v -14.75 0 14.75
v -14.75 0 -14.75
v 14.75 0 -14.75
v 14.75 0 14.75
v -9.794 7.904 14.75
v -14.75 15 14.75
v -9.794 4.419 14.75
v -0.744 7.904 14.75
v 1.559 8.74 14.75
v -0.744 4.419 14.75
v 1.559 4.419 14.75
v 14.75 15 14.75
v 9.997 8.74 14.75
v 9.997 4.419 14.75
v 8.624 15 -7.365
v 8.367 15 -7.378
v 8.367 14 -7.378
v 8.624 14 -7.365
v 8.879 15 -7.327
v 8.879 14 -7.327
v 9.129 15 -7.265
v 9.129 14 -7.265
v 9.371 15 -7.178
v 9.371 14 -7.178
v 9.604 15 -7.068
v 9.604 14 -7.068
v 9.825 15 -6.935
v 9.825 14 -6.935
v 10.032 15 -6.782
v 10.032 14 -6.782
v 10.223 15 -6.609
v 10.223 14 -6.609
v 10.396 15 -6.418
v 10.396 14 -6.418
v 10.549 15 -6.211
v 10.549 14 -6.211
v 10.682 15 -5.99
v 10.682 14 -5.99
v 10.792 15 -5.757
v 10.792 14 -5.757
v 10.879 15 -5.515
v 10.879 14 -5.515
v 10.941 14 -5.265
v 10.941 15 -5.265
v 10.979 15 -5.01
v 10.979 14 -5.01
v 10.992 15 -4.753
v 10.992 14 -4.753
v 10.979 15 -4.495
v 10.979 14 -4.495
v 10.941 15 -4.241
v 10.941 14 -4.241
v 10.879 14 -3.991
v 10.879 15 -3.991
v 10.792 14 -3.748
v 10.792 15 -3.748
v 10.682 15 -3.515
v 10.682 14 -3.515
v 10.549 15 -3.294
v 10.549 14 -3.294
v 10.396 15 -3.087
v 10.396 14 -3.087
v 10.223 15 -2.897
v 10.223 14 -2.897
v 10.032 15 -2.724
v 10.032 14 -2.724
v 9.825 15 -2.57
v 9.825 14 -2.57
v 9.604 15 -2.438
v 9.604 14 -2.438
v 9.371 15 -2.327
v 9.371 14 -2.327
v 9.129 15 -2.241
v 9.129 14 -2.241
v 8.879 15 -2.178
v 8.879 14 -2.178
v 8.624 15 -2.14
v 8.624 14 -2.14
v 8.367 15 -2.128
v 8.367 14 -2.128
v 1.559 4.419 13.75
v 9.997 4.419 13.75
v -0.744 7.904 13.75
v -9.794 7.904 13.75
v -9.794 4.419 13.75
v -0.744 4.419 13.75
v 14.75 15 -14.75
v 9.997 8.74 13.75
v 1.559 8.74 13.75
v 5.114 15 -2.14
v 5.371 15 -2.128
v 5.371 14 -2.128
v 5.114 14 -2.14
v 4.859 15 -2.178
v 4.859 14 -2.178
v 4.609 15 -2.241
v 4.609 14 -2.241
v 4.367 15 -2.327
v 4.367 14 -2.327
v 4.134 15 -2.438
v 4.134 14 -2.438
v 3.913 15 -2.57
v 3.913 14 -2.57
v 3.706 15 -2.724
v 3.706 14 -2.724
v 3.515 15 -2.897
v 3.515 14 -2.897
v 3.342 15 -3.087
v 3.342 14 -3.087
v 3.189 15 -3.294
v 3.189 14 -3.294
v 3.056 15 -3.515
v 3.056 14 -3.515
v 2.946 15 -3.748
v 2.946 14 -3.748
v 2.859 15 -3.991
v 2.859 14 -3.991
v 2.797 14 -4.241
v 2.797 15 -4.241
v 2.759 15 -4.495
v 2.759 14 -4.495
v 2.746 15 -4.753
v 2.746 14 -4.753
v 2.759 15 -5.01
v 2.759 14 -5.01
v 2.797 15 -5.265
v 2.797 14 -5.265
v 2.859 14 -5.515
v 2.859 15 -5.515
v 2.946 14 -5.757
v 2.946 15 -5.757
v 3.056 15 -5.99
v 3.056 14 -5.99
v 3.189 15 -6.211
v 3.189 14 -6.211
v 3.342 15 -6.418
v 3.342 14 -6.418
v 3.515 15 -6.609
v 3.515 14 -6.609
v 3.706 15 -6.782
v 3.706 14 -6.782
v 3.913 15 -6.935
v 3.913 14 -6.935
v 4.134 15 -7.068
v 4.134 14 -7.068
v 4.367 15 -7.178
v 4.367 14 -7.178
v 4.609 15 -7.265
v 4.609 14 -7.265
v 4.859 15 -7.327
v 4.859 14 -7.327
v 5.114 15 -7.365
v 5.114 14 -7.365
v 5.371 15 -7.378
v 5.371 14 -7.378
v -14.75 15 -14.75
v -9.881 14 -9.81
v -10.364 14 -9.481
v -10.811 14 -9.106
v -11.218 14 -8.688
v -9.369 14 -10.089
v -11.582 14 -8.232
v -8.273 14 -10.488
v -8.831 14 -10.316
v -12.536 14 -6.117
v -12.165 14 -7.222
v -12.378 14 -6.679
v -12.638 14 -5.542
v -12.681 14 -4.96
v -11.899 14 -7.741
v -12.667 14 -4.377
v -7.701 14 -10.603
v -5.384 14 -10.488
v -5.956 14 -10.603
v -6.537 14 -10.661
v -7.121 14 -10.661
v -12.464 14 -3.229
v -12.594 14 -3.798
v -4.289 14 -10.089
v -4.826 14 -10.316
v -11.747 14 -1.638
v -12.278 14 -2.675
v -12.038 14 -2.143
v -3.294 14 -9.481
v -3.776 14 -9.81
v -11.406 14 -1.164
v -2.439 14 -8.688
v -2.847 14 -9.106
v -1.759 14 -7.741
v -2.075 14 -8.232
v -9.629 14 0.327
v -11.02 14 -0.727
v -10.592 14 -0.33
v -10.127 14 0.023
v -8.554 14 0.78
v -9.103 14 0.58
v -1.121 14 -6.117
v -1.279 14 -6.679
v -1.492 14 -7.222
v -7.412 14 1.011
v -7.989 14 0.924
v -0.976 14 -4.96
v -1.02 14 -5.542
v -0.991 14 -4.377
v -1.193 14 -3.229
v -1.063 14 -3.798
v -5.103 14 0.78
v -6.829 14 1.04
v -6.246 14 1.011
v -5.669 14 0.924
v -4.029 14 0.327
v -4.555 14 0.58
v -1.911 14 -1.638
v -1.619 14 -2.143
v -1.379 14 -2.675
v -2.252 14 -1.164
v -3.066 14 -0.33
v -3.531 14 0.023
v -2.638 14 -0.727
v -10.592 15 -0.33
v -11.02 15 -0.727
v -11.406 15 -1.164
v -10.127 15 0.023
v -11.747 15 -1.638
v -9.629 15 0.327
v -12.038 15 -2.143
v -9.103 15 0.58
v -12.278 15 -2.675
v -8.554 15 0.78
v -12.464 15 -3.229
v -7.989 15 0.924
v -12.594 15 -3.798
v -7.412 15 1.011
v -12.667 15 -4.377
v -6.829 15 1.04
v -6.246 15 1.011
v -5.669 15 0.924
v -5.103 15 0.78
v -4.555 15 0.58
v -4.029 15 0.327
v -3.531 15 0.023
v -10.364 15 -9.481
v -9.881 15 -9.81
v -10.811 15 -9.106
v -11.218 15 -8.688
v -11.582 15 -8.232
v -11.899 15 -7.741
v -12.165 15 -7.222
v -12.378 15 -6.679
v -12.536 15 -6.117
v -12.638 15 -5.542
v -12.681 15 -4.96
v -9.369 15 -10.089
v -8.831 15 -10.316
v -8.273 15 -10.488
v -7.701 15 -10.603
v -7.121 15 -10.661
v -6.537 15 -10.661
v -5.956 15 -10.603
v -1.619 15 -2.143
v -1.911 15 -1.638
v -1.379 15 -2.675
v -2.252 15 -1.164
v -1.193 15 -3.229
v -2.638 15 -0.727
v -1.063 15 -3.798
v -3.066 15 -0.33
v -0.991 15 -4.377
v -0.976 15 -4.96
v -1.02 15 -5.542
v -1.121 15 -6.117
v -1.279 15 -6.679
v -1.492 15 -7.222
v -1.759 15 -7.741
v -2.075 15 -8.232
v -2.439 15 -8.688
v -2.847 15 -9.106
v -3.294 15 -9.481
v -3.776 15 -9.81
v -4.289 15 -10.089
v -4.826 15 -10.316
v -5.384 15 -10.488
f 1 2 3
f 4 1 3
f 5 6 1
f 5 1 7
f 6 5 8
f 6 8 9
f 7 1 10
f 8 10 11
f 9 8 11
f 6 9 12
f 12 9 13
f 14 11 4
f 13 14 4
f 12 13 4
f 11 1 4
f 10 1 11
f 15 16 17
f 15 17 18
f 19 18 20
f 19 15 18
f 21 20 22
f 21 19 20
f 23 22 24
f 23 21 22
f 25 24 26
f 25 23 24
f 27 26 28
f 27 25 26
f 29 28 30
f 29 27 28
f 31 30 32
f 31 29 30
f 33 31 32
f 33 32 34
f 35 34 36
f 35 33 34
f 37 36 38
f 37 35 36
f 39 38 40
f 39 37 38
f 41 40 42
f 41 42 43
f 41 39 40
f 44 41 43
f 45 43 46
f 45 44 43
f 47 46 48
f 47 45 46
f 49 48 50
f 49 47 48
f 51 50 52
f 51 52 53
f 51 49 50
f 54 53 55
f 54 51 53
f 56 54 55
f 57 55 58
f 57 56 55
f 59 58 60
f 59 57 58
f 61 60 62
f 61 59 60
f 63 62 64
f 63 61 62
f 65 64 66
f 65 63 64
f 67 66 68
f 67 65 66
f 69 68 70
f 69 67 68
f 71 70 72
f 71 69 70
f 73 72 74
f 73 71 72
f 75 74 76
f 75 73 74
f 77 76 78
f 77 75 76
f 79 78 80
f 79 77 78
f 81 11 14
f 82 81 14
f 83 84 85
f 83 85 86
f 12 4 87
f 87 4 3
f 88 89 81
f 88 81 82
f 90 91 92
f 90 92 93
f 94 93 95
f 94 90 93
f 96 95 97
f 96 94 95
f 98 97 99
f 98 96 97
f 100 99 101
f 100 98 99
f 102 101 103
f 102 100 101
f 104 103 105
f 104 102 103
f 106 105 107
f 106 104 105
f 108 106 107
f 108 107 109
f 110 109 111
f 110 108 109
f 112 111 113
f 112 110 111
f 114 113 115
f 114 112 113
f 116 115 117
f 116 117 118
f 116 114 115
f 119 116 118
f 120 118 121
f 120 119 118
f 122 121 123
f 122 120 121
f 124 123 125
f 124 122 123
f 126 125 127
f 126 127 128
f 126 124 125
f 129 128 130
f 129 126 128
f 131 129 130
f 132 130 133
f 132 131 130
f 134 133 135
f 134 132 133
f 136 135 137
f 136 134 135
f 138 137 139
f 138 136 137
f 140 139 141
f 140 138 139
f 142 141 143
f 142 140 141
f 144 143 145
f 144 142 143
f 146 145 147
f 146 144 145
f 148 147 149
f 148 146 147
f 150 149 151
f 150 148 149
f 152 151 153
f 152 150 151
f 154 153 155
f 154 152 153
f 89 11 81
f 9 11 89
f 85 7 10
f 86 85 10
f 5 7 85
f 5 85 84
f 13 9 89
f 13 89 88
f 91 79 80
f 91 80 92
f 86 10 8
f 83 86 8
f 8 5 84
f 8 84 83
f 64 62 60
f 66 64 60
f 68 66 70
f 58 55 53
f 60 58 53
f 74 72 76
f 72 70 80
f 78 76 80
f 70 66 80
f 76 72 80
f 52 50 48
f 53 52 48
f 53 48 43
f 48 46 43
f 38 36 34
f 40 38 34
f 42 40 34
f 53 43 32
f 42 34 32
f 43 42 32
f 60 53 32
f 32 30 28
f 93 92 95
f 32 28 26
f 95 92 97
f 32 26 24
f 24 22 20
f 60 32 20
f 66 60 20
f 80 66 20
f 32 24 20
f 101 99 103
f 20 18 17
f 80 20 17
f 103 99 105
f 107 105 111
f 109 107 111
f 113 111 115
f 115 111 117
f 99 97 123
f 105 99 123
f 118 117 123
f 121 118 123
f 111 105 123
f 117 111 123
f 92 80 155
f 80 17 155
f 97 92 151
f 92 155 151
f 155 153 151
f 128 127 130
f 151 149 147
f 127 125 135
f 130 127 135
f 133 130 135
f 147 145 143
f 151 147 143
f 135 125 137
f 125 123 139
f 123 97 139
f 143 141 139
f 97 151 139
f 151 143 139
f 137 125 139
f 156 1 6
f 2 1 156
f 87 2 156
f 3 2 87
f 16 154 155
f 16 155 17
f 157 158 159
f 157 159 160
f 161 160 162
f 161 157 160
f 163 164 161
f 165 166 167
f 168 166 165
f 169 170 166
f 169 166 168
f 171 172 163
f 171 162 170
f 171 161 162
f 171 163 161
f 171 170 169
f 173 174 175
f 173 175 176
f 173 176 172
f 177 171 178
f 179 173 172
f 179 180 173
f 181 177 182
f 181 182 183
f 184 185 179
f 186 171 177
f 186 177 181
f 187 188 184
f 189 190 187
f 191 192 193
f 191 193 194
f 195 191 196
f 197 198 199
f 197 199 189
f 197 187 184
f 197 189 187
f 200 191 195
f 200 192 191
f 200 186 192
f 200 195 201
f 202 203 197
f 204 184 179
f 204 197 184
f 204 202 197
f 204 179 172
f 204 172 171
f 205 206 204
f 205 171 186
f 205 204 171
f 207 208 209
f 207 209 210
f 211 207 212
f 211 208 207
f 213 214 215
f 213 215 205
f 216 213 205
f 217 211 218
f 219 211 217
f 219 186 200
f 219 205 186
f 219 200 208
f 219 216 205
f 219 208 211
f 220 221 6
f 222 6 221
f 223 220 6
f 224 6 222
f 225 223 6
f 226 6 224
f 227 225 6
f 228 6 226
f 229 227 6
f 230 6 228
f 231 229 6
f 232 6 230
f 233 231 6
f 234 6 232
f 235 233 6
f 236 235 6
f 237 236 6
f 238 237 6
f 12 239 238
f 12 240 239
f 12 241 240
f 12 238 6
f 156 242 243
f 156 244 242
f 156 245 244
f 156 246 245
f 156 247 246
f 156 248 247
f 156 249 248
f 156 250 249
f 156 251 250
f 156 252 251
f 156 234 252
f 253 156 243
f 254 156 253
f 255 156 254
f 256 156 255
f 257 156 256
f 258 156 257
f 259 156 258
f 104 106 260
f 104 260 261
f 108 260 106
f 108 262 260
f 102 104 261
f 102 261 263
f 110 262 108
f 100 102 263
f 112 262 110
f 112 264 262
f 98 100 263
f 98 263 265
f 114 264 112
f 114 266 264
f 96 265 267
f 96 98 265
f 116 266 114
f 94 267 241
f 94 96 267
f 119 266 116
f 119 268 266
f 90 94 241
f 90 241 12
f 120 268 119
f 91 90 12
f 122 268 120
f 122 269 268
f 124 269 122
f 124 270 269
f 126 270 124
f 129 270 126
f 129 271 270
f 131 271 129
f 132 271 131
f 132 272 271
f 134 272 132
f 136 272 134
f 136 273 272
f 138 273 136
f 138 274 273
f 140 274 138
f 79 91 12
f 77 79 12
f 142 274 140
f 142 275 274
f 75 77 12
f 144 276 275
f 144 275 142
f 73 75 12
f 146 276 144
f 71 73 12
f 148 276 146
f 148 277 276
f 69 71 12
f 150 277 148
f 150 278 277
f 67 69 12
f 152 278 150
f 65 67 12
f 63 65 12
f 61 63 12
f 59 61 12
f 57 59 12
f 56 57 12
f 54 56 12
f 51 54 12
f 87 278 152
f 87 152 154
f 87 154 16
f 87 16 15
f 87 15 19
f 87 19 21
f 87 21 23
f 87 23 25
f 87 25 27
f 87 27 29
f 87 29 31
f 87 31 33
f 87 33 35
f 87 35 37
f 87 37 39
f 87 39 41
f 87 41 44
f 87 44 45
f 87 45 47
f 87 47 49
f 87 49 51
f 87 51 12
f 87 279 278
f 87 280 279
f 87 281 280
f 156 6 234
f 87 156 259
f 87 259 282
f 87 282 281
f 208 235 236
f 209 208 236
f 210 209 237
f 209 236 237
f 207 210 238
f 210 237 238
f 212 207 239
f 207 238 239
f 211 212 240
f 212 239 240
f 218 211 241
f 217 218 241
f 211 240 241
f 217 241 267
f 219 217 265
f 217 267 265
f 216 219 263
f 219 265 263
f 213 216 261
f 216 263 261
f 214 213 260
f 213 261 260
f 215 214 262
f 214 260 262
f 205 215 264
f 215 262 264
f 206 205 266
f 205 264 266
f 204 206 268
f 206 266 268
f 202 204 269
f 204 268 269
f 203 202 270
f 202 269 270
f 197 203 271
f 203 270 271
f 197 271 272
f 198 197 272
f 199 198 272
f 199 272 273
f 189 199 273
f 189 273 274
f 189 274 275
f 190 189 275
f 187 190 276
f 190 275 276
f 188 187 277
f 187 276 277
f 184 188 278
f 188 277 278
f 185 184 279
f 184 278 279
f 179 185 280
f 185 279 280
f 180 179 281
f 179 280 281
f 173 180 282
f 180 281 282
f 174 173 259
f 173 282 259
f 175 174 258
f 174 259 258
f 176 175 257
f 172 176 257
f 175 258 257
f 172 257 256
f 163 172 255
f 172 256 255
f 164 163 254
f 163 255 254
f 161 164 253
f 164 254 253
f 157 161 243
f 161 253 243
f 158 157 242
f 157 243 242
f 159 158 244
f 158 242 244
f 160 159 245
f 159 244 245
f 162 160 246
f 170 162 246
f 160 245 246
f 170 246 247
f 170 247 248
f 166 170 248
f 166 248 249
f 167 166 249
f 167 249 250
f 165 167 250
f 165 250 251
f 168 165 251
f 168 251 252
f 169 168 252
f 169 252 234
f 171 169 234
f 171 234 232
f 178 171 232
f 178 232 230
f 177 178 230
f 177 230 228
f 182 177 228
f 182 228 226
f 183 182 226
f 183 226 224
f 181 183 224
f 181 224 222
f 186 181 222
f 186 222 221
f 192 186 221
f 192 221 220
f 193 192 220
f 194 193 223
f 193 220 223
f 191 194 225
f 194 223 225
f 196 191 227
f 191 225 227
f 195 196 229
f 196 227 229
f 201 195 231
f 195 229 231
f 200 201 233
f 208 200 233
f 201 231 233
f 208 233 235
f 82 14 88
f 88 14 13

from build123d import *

# Parameters (mm, degrees)
SKETCH_1_W          = 29.5
SKETCH_1_H          = 29.5
EXTRUDE_1_DEPTH     = 15
SKETCH_4_R          = 5.854360827
CUT_EXTRUDE_1_DEPTH = 1
SKETCH_5_W          = 8.438163648
SKETCH_5_H          = 4.320992013
SKETCH_5_W_2        = 9.049624782
SKETCH_5_H_2        = 3.485328464
CUT_EXTRUDE_2_DEPTH = 1


with BuildPart() as part:
    # 草图1 → 凸台-拉伸1 (new body)
    with BuildSketch(Plane(origin=(0, 0, 0), x_dir=(1, 0, 0), z_dir=(0, 1, 0))):
        Rectangle(SKETCH_1_W, SKETCH_1_H)
    extrude(amount=EXTRUDE_1_DEPTH)

    # 草图4 → 切除-拉伸1 (cut)
    with BuildSketch(Plane(origin=(0, 15, 0), x_dir=(1, 0, 0), z_dir=(0, 1, 0))):
        with Locations(Location((-6.828709963, 4.814266748, 0), (0, 0, 270))):
            Circle(SKETCH_4_R)
        with BuildLine():
            Line((5.371174923, 7.377688131), (8.366864515, 7.377688131))
            ThreePointArc((8.366864515, 7.377688131), (10.991875344, 4.752677302), (8.366864515, 2.127666472))
            Line((8.366864515, 2.127666472), (5.371174923, 2.127666472))
            ThreePointArc((5.371174923, 2.127666472), (2.746164094, 4.752677302), (5.371174923, 7.377688131))
        make_face()
    extrude(amount=-CUT_EXTRUDE_1_DEPTH, mode=Mode.SUBTRACT)

    # 草图5 → 切除-拉伸2 (cut)
    with BuildSketch(Plane.XY.offset(14.75)):
        with Locations((5.778081635, 6.579139216)):
            Rectangle(SKETCH_5_W, SKETCH_5_H)
        with Locations((-5.268982852, 6.161307442)):
            Rectangle(SKETCH_5_W_2, SKETCH_5_H_2)
    extrude(amount=-CUT_EXTRUDE_2_DEPTH, mode=Mode.SUBTRACT)


solid = part.part
